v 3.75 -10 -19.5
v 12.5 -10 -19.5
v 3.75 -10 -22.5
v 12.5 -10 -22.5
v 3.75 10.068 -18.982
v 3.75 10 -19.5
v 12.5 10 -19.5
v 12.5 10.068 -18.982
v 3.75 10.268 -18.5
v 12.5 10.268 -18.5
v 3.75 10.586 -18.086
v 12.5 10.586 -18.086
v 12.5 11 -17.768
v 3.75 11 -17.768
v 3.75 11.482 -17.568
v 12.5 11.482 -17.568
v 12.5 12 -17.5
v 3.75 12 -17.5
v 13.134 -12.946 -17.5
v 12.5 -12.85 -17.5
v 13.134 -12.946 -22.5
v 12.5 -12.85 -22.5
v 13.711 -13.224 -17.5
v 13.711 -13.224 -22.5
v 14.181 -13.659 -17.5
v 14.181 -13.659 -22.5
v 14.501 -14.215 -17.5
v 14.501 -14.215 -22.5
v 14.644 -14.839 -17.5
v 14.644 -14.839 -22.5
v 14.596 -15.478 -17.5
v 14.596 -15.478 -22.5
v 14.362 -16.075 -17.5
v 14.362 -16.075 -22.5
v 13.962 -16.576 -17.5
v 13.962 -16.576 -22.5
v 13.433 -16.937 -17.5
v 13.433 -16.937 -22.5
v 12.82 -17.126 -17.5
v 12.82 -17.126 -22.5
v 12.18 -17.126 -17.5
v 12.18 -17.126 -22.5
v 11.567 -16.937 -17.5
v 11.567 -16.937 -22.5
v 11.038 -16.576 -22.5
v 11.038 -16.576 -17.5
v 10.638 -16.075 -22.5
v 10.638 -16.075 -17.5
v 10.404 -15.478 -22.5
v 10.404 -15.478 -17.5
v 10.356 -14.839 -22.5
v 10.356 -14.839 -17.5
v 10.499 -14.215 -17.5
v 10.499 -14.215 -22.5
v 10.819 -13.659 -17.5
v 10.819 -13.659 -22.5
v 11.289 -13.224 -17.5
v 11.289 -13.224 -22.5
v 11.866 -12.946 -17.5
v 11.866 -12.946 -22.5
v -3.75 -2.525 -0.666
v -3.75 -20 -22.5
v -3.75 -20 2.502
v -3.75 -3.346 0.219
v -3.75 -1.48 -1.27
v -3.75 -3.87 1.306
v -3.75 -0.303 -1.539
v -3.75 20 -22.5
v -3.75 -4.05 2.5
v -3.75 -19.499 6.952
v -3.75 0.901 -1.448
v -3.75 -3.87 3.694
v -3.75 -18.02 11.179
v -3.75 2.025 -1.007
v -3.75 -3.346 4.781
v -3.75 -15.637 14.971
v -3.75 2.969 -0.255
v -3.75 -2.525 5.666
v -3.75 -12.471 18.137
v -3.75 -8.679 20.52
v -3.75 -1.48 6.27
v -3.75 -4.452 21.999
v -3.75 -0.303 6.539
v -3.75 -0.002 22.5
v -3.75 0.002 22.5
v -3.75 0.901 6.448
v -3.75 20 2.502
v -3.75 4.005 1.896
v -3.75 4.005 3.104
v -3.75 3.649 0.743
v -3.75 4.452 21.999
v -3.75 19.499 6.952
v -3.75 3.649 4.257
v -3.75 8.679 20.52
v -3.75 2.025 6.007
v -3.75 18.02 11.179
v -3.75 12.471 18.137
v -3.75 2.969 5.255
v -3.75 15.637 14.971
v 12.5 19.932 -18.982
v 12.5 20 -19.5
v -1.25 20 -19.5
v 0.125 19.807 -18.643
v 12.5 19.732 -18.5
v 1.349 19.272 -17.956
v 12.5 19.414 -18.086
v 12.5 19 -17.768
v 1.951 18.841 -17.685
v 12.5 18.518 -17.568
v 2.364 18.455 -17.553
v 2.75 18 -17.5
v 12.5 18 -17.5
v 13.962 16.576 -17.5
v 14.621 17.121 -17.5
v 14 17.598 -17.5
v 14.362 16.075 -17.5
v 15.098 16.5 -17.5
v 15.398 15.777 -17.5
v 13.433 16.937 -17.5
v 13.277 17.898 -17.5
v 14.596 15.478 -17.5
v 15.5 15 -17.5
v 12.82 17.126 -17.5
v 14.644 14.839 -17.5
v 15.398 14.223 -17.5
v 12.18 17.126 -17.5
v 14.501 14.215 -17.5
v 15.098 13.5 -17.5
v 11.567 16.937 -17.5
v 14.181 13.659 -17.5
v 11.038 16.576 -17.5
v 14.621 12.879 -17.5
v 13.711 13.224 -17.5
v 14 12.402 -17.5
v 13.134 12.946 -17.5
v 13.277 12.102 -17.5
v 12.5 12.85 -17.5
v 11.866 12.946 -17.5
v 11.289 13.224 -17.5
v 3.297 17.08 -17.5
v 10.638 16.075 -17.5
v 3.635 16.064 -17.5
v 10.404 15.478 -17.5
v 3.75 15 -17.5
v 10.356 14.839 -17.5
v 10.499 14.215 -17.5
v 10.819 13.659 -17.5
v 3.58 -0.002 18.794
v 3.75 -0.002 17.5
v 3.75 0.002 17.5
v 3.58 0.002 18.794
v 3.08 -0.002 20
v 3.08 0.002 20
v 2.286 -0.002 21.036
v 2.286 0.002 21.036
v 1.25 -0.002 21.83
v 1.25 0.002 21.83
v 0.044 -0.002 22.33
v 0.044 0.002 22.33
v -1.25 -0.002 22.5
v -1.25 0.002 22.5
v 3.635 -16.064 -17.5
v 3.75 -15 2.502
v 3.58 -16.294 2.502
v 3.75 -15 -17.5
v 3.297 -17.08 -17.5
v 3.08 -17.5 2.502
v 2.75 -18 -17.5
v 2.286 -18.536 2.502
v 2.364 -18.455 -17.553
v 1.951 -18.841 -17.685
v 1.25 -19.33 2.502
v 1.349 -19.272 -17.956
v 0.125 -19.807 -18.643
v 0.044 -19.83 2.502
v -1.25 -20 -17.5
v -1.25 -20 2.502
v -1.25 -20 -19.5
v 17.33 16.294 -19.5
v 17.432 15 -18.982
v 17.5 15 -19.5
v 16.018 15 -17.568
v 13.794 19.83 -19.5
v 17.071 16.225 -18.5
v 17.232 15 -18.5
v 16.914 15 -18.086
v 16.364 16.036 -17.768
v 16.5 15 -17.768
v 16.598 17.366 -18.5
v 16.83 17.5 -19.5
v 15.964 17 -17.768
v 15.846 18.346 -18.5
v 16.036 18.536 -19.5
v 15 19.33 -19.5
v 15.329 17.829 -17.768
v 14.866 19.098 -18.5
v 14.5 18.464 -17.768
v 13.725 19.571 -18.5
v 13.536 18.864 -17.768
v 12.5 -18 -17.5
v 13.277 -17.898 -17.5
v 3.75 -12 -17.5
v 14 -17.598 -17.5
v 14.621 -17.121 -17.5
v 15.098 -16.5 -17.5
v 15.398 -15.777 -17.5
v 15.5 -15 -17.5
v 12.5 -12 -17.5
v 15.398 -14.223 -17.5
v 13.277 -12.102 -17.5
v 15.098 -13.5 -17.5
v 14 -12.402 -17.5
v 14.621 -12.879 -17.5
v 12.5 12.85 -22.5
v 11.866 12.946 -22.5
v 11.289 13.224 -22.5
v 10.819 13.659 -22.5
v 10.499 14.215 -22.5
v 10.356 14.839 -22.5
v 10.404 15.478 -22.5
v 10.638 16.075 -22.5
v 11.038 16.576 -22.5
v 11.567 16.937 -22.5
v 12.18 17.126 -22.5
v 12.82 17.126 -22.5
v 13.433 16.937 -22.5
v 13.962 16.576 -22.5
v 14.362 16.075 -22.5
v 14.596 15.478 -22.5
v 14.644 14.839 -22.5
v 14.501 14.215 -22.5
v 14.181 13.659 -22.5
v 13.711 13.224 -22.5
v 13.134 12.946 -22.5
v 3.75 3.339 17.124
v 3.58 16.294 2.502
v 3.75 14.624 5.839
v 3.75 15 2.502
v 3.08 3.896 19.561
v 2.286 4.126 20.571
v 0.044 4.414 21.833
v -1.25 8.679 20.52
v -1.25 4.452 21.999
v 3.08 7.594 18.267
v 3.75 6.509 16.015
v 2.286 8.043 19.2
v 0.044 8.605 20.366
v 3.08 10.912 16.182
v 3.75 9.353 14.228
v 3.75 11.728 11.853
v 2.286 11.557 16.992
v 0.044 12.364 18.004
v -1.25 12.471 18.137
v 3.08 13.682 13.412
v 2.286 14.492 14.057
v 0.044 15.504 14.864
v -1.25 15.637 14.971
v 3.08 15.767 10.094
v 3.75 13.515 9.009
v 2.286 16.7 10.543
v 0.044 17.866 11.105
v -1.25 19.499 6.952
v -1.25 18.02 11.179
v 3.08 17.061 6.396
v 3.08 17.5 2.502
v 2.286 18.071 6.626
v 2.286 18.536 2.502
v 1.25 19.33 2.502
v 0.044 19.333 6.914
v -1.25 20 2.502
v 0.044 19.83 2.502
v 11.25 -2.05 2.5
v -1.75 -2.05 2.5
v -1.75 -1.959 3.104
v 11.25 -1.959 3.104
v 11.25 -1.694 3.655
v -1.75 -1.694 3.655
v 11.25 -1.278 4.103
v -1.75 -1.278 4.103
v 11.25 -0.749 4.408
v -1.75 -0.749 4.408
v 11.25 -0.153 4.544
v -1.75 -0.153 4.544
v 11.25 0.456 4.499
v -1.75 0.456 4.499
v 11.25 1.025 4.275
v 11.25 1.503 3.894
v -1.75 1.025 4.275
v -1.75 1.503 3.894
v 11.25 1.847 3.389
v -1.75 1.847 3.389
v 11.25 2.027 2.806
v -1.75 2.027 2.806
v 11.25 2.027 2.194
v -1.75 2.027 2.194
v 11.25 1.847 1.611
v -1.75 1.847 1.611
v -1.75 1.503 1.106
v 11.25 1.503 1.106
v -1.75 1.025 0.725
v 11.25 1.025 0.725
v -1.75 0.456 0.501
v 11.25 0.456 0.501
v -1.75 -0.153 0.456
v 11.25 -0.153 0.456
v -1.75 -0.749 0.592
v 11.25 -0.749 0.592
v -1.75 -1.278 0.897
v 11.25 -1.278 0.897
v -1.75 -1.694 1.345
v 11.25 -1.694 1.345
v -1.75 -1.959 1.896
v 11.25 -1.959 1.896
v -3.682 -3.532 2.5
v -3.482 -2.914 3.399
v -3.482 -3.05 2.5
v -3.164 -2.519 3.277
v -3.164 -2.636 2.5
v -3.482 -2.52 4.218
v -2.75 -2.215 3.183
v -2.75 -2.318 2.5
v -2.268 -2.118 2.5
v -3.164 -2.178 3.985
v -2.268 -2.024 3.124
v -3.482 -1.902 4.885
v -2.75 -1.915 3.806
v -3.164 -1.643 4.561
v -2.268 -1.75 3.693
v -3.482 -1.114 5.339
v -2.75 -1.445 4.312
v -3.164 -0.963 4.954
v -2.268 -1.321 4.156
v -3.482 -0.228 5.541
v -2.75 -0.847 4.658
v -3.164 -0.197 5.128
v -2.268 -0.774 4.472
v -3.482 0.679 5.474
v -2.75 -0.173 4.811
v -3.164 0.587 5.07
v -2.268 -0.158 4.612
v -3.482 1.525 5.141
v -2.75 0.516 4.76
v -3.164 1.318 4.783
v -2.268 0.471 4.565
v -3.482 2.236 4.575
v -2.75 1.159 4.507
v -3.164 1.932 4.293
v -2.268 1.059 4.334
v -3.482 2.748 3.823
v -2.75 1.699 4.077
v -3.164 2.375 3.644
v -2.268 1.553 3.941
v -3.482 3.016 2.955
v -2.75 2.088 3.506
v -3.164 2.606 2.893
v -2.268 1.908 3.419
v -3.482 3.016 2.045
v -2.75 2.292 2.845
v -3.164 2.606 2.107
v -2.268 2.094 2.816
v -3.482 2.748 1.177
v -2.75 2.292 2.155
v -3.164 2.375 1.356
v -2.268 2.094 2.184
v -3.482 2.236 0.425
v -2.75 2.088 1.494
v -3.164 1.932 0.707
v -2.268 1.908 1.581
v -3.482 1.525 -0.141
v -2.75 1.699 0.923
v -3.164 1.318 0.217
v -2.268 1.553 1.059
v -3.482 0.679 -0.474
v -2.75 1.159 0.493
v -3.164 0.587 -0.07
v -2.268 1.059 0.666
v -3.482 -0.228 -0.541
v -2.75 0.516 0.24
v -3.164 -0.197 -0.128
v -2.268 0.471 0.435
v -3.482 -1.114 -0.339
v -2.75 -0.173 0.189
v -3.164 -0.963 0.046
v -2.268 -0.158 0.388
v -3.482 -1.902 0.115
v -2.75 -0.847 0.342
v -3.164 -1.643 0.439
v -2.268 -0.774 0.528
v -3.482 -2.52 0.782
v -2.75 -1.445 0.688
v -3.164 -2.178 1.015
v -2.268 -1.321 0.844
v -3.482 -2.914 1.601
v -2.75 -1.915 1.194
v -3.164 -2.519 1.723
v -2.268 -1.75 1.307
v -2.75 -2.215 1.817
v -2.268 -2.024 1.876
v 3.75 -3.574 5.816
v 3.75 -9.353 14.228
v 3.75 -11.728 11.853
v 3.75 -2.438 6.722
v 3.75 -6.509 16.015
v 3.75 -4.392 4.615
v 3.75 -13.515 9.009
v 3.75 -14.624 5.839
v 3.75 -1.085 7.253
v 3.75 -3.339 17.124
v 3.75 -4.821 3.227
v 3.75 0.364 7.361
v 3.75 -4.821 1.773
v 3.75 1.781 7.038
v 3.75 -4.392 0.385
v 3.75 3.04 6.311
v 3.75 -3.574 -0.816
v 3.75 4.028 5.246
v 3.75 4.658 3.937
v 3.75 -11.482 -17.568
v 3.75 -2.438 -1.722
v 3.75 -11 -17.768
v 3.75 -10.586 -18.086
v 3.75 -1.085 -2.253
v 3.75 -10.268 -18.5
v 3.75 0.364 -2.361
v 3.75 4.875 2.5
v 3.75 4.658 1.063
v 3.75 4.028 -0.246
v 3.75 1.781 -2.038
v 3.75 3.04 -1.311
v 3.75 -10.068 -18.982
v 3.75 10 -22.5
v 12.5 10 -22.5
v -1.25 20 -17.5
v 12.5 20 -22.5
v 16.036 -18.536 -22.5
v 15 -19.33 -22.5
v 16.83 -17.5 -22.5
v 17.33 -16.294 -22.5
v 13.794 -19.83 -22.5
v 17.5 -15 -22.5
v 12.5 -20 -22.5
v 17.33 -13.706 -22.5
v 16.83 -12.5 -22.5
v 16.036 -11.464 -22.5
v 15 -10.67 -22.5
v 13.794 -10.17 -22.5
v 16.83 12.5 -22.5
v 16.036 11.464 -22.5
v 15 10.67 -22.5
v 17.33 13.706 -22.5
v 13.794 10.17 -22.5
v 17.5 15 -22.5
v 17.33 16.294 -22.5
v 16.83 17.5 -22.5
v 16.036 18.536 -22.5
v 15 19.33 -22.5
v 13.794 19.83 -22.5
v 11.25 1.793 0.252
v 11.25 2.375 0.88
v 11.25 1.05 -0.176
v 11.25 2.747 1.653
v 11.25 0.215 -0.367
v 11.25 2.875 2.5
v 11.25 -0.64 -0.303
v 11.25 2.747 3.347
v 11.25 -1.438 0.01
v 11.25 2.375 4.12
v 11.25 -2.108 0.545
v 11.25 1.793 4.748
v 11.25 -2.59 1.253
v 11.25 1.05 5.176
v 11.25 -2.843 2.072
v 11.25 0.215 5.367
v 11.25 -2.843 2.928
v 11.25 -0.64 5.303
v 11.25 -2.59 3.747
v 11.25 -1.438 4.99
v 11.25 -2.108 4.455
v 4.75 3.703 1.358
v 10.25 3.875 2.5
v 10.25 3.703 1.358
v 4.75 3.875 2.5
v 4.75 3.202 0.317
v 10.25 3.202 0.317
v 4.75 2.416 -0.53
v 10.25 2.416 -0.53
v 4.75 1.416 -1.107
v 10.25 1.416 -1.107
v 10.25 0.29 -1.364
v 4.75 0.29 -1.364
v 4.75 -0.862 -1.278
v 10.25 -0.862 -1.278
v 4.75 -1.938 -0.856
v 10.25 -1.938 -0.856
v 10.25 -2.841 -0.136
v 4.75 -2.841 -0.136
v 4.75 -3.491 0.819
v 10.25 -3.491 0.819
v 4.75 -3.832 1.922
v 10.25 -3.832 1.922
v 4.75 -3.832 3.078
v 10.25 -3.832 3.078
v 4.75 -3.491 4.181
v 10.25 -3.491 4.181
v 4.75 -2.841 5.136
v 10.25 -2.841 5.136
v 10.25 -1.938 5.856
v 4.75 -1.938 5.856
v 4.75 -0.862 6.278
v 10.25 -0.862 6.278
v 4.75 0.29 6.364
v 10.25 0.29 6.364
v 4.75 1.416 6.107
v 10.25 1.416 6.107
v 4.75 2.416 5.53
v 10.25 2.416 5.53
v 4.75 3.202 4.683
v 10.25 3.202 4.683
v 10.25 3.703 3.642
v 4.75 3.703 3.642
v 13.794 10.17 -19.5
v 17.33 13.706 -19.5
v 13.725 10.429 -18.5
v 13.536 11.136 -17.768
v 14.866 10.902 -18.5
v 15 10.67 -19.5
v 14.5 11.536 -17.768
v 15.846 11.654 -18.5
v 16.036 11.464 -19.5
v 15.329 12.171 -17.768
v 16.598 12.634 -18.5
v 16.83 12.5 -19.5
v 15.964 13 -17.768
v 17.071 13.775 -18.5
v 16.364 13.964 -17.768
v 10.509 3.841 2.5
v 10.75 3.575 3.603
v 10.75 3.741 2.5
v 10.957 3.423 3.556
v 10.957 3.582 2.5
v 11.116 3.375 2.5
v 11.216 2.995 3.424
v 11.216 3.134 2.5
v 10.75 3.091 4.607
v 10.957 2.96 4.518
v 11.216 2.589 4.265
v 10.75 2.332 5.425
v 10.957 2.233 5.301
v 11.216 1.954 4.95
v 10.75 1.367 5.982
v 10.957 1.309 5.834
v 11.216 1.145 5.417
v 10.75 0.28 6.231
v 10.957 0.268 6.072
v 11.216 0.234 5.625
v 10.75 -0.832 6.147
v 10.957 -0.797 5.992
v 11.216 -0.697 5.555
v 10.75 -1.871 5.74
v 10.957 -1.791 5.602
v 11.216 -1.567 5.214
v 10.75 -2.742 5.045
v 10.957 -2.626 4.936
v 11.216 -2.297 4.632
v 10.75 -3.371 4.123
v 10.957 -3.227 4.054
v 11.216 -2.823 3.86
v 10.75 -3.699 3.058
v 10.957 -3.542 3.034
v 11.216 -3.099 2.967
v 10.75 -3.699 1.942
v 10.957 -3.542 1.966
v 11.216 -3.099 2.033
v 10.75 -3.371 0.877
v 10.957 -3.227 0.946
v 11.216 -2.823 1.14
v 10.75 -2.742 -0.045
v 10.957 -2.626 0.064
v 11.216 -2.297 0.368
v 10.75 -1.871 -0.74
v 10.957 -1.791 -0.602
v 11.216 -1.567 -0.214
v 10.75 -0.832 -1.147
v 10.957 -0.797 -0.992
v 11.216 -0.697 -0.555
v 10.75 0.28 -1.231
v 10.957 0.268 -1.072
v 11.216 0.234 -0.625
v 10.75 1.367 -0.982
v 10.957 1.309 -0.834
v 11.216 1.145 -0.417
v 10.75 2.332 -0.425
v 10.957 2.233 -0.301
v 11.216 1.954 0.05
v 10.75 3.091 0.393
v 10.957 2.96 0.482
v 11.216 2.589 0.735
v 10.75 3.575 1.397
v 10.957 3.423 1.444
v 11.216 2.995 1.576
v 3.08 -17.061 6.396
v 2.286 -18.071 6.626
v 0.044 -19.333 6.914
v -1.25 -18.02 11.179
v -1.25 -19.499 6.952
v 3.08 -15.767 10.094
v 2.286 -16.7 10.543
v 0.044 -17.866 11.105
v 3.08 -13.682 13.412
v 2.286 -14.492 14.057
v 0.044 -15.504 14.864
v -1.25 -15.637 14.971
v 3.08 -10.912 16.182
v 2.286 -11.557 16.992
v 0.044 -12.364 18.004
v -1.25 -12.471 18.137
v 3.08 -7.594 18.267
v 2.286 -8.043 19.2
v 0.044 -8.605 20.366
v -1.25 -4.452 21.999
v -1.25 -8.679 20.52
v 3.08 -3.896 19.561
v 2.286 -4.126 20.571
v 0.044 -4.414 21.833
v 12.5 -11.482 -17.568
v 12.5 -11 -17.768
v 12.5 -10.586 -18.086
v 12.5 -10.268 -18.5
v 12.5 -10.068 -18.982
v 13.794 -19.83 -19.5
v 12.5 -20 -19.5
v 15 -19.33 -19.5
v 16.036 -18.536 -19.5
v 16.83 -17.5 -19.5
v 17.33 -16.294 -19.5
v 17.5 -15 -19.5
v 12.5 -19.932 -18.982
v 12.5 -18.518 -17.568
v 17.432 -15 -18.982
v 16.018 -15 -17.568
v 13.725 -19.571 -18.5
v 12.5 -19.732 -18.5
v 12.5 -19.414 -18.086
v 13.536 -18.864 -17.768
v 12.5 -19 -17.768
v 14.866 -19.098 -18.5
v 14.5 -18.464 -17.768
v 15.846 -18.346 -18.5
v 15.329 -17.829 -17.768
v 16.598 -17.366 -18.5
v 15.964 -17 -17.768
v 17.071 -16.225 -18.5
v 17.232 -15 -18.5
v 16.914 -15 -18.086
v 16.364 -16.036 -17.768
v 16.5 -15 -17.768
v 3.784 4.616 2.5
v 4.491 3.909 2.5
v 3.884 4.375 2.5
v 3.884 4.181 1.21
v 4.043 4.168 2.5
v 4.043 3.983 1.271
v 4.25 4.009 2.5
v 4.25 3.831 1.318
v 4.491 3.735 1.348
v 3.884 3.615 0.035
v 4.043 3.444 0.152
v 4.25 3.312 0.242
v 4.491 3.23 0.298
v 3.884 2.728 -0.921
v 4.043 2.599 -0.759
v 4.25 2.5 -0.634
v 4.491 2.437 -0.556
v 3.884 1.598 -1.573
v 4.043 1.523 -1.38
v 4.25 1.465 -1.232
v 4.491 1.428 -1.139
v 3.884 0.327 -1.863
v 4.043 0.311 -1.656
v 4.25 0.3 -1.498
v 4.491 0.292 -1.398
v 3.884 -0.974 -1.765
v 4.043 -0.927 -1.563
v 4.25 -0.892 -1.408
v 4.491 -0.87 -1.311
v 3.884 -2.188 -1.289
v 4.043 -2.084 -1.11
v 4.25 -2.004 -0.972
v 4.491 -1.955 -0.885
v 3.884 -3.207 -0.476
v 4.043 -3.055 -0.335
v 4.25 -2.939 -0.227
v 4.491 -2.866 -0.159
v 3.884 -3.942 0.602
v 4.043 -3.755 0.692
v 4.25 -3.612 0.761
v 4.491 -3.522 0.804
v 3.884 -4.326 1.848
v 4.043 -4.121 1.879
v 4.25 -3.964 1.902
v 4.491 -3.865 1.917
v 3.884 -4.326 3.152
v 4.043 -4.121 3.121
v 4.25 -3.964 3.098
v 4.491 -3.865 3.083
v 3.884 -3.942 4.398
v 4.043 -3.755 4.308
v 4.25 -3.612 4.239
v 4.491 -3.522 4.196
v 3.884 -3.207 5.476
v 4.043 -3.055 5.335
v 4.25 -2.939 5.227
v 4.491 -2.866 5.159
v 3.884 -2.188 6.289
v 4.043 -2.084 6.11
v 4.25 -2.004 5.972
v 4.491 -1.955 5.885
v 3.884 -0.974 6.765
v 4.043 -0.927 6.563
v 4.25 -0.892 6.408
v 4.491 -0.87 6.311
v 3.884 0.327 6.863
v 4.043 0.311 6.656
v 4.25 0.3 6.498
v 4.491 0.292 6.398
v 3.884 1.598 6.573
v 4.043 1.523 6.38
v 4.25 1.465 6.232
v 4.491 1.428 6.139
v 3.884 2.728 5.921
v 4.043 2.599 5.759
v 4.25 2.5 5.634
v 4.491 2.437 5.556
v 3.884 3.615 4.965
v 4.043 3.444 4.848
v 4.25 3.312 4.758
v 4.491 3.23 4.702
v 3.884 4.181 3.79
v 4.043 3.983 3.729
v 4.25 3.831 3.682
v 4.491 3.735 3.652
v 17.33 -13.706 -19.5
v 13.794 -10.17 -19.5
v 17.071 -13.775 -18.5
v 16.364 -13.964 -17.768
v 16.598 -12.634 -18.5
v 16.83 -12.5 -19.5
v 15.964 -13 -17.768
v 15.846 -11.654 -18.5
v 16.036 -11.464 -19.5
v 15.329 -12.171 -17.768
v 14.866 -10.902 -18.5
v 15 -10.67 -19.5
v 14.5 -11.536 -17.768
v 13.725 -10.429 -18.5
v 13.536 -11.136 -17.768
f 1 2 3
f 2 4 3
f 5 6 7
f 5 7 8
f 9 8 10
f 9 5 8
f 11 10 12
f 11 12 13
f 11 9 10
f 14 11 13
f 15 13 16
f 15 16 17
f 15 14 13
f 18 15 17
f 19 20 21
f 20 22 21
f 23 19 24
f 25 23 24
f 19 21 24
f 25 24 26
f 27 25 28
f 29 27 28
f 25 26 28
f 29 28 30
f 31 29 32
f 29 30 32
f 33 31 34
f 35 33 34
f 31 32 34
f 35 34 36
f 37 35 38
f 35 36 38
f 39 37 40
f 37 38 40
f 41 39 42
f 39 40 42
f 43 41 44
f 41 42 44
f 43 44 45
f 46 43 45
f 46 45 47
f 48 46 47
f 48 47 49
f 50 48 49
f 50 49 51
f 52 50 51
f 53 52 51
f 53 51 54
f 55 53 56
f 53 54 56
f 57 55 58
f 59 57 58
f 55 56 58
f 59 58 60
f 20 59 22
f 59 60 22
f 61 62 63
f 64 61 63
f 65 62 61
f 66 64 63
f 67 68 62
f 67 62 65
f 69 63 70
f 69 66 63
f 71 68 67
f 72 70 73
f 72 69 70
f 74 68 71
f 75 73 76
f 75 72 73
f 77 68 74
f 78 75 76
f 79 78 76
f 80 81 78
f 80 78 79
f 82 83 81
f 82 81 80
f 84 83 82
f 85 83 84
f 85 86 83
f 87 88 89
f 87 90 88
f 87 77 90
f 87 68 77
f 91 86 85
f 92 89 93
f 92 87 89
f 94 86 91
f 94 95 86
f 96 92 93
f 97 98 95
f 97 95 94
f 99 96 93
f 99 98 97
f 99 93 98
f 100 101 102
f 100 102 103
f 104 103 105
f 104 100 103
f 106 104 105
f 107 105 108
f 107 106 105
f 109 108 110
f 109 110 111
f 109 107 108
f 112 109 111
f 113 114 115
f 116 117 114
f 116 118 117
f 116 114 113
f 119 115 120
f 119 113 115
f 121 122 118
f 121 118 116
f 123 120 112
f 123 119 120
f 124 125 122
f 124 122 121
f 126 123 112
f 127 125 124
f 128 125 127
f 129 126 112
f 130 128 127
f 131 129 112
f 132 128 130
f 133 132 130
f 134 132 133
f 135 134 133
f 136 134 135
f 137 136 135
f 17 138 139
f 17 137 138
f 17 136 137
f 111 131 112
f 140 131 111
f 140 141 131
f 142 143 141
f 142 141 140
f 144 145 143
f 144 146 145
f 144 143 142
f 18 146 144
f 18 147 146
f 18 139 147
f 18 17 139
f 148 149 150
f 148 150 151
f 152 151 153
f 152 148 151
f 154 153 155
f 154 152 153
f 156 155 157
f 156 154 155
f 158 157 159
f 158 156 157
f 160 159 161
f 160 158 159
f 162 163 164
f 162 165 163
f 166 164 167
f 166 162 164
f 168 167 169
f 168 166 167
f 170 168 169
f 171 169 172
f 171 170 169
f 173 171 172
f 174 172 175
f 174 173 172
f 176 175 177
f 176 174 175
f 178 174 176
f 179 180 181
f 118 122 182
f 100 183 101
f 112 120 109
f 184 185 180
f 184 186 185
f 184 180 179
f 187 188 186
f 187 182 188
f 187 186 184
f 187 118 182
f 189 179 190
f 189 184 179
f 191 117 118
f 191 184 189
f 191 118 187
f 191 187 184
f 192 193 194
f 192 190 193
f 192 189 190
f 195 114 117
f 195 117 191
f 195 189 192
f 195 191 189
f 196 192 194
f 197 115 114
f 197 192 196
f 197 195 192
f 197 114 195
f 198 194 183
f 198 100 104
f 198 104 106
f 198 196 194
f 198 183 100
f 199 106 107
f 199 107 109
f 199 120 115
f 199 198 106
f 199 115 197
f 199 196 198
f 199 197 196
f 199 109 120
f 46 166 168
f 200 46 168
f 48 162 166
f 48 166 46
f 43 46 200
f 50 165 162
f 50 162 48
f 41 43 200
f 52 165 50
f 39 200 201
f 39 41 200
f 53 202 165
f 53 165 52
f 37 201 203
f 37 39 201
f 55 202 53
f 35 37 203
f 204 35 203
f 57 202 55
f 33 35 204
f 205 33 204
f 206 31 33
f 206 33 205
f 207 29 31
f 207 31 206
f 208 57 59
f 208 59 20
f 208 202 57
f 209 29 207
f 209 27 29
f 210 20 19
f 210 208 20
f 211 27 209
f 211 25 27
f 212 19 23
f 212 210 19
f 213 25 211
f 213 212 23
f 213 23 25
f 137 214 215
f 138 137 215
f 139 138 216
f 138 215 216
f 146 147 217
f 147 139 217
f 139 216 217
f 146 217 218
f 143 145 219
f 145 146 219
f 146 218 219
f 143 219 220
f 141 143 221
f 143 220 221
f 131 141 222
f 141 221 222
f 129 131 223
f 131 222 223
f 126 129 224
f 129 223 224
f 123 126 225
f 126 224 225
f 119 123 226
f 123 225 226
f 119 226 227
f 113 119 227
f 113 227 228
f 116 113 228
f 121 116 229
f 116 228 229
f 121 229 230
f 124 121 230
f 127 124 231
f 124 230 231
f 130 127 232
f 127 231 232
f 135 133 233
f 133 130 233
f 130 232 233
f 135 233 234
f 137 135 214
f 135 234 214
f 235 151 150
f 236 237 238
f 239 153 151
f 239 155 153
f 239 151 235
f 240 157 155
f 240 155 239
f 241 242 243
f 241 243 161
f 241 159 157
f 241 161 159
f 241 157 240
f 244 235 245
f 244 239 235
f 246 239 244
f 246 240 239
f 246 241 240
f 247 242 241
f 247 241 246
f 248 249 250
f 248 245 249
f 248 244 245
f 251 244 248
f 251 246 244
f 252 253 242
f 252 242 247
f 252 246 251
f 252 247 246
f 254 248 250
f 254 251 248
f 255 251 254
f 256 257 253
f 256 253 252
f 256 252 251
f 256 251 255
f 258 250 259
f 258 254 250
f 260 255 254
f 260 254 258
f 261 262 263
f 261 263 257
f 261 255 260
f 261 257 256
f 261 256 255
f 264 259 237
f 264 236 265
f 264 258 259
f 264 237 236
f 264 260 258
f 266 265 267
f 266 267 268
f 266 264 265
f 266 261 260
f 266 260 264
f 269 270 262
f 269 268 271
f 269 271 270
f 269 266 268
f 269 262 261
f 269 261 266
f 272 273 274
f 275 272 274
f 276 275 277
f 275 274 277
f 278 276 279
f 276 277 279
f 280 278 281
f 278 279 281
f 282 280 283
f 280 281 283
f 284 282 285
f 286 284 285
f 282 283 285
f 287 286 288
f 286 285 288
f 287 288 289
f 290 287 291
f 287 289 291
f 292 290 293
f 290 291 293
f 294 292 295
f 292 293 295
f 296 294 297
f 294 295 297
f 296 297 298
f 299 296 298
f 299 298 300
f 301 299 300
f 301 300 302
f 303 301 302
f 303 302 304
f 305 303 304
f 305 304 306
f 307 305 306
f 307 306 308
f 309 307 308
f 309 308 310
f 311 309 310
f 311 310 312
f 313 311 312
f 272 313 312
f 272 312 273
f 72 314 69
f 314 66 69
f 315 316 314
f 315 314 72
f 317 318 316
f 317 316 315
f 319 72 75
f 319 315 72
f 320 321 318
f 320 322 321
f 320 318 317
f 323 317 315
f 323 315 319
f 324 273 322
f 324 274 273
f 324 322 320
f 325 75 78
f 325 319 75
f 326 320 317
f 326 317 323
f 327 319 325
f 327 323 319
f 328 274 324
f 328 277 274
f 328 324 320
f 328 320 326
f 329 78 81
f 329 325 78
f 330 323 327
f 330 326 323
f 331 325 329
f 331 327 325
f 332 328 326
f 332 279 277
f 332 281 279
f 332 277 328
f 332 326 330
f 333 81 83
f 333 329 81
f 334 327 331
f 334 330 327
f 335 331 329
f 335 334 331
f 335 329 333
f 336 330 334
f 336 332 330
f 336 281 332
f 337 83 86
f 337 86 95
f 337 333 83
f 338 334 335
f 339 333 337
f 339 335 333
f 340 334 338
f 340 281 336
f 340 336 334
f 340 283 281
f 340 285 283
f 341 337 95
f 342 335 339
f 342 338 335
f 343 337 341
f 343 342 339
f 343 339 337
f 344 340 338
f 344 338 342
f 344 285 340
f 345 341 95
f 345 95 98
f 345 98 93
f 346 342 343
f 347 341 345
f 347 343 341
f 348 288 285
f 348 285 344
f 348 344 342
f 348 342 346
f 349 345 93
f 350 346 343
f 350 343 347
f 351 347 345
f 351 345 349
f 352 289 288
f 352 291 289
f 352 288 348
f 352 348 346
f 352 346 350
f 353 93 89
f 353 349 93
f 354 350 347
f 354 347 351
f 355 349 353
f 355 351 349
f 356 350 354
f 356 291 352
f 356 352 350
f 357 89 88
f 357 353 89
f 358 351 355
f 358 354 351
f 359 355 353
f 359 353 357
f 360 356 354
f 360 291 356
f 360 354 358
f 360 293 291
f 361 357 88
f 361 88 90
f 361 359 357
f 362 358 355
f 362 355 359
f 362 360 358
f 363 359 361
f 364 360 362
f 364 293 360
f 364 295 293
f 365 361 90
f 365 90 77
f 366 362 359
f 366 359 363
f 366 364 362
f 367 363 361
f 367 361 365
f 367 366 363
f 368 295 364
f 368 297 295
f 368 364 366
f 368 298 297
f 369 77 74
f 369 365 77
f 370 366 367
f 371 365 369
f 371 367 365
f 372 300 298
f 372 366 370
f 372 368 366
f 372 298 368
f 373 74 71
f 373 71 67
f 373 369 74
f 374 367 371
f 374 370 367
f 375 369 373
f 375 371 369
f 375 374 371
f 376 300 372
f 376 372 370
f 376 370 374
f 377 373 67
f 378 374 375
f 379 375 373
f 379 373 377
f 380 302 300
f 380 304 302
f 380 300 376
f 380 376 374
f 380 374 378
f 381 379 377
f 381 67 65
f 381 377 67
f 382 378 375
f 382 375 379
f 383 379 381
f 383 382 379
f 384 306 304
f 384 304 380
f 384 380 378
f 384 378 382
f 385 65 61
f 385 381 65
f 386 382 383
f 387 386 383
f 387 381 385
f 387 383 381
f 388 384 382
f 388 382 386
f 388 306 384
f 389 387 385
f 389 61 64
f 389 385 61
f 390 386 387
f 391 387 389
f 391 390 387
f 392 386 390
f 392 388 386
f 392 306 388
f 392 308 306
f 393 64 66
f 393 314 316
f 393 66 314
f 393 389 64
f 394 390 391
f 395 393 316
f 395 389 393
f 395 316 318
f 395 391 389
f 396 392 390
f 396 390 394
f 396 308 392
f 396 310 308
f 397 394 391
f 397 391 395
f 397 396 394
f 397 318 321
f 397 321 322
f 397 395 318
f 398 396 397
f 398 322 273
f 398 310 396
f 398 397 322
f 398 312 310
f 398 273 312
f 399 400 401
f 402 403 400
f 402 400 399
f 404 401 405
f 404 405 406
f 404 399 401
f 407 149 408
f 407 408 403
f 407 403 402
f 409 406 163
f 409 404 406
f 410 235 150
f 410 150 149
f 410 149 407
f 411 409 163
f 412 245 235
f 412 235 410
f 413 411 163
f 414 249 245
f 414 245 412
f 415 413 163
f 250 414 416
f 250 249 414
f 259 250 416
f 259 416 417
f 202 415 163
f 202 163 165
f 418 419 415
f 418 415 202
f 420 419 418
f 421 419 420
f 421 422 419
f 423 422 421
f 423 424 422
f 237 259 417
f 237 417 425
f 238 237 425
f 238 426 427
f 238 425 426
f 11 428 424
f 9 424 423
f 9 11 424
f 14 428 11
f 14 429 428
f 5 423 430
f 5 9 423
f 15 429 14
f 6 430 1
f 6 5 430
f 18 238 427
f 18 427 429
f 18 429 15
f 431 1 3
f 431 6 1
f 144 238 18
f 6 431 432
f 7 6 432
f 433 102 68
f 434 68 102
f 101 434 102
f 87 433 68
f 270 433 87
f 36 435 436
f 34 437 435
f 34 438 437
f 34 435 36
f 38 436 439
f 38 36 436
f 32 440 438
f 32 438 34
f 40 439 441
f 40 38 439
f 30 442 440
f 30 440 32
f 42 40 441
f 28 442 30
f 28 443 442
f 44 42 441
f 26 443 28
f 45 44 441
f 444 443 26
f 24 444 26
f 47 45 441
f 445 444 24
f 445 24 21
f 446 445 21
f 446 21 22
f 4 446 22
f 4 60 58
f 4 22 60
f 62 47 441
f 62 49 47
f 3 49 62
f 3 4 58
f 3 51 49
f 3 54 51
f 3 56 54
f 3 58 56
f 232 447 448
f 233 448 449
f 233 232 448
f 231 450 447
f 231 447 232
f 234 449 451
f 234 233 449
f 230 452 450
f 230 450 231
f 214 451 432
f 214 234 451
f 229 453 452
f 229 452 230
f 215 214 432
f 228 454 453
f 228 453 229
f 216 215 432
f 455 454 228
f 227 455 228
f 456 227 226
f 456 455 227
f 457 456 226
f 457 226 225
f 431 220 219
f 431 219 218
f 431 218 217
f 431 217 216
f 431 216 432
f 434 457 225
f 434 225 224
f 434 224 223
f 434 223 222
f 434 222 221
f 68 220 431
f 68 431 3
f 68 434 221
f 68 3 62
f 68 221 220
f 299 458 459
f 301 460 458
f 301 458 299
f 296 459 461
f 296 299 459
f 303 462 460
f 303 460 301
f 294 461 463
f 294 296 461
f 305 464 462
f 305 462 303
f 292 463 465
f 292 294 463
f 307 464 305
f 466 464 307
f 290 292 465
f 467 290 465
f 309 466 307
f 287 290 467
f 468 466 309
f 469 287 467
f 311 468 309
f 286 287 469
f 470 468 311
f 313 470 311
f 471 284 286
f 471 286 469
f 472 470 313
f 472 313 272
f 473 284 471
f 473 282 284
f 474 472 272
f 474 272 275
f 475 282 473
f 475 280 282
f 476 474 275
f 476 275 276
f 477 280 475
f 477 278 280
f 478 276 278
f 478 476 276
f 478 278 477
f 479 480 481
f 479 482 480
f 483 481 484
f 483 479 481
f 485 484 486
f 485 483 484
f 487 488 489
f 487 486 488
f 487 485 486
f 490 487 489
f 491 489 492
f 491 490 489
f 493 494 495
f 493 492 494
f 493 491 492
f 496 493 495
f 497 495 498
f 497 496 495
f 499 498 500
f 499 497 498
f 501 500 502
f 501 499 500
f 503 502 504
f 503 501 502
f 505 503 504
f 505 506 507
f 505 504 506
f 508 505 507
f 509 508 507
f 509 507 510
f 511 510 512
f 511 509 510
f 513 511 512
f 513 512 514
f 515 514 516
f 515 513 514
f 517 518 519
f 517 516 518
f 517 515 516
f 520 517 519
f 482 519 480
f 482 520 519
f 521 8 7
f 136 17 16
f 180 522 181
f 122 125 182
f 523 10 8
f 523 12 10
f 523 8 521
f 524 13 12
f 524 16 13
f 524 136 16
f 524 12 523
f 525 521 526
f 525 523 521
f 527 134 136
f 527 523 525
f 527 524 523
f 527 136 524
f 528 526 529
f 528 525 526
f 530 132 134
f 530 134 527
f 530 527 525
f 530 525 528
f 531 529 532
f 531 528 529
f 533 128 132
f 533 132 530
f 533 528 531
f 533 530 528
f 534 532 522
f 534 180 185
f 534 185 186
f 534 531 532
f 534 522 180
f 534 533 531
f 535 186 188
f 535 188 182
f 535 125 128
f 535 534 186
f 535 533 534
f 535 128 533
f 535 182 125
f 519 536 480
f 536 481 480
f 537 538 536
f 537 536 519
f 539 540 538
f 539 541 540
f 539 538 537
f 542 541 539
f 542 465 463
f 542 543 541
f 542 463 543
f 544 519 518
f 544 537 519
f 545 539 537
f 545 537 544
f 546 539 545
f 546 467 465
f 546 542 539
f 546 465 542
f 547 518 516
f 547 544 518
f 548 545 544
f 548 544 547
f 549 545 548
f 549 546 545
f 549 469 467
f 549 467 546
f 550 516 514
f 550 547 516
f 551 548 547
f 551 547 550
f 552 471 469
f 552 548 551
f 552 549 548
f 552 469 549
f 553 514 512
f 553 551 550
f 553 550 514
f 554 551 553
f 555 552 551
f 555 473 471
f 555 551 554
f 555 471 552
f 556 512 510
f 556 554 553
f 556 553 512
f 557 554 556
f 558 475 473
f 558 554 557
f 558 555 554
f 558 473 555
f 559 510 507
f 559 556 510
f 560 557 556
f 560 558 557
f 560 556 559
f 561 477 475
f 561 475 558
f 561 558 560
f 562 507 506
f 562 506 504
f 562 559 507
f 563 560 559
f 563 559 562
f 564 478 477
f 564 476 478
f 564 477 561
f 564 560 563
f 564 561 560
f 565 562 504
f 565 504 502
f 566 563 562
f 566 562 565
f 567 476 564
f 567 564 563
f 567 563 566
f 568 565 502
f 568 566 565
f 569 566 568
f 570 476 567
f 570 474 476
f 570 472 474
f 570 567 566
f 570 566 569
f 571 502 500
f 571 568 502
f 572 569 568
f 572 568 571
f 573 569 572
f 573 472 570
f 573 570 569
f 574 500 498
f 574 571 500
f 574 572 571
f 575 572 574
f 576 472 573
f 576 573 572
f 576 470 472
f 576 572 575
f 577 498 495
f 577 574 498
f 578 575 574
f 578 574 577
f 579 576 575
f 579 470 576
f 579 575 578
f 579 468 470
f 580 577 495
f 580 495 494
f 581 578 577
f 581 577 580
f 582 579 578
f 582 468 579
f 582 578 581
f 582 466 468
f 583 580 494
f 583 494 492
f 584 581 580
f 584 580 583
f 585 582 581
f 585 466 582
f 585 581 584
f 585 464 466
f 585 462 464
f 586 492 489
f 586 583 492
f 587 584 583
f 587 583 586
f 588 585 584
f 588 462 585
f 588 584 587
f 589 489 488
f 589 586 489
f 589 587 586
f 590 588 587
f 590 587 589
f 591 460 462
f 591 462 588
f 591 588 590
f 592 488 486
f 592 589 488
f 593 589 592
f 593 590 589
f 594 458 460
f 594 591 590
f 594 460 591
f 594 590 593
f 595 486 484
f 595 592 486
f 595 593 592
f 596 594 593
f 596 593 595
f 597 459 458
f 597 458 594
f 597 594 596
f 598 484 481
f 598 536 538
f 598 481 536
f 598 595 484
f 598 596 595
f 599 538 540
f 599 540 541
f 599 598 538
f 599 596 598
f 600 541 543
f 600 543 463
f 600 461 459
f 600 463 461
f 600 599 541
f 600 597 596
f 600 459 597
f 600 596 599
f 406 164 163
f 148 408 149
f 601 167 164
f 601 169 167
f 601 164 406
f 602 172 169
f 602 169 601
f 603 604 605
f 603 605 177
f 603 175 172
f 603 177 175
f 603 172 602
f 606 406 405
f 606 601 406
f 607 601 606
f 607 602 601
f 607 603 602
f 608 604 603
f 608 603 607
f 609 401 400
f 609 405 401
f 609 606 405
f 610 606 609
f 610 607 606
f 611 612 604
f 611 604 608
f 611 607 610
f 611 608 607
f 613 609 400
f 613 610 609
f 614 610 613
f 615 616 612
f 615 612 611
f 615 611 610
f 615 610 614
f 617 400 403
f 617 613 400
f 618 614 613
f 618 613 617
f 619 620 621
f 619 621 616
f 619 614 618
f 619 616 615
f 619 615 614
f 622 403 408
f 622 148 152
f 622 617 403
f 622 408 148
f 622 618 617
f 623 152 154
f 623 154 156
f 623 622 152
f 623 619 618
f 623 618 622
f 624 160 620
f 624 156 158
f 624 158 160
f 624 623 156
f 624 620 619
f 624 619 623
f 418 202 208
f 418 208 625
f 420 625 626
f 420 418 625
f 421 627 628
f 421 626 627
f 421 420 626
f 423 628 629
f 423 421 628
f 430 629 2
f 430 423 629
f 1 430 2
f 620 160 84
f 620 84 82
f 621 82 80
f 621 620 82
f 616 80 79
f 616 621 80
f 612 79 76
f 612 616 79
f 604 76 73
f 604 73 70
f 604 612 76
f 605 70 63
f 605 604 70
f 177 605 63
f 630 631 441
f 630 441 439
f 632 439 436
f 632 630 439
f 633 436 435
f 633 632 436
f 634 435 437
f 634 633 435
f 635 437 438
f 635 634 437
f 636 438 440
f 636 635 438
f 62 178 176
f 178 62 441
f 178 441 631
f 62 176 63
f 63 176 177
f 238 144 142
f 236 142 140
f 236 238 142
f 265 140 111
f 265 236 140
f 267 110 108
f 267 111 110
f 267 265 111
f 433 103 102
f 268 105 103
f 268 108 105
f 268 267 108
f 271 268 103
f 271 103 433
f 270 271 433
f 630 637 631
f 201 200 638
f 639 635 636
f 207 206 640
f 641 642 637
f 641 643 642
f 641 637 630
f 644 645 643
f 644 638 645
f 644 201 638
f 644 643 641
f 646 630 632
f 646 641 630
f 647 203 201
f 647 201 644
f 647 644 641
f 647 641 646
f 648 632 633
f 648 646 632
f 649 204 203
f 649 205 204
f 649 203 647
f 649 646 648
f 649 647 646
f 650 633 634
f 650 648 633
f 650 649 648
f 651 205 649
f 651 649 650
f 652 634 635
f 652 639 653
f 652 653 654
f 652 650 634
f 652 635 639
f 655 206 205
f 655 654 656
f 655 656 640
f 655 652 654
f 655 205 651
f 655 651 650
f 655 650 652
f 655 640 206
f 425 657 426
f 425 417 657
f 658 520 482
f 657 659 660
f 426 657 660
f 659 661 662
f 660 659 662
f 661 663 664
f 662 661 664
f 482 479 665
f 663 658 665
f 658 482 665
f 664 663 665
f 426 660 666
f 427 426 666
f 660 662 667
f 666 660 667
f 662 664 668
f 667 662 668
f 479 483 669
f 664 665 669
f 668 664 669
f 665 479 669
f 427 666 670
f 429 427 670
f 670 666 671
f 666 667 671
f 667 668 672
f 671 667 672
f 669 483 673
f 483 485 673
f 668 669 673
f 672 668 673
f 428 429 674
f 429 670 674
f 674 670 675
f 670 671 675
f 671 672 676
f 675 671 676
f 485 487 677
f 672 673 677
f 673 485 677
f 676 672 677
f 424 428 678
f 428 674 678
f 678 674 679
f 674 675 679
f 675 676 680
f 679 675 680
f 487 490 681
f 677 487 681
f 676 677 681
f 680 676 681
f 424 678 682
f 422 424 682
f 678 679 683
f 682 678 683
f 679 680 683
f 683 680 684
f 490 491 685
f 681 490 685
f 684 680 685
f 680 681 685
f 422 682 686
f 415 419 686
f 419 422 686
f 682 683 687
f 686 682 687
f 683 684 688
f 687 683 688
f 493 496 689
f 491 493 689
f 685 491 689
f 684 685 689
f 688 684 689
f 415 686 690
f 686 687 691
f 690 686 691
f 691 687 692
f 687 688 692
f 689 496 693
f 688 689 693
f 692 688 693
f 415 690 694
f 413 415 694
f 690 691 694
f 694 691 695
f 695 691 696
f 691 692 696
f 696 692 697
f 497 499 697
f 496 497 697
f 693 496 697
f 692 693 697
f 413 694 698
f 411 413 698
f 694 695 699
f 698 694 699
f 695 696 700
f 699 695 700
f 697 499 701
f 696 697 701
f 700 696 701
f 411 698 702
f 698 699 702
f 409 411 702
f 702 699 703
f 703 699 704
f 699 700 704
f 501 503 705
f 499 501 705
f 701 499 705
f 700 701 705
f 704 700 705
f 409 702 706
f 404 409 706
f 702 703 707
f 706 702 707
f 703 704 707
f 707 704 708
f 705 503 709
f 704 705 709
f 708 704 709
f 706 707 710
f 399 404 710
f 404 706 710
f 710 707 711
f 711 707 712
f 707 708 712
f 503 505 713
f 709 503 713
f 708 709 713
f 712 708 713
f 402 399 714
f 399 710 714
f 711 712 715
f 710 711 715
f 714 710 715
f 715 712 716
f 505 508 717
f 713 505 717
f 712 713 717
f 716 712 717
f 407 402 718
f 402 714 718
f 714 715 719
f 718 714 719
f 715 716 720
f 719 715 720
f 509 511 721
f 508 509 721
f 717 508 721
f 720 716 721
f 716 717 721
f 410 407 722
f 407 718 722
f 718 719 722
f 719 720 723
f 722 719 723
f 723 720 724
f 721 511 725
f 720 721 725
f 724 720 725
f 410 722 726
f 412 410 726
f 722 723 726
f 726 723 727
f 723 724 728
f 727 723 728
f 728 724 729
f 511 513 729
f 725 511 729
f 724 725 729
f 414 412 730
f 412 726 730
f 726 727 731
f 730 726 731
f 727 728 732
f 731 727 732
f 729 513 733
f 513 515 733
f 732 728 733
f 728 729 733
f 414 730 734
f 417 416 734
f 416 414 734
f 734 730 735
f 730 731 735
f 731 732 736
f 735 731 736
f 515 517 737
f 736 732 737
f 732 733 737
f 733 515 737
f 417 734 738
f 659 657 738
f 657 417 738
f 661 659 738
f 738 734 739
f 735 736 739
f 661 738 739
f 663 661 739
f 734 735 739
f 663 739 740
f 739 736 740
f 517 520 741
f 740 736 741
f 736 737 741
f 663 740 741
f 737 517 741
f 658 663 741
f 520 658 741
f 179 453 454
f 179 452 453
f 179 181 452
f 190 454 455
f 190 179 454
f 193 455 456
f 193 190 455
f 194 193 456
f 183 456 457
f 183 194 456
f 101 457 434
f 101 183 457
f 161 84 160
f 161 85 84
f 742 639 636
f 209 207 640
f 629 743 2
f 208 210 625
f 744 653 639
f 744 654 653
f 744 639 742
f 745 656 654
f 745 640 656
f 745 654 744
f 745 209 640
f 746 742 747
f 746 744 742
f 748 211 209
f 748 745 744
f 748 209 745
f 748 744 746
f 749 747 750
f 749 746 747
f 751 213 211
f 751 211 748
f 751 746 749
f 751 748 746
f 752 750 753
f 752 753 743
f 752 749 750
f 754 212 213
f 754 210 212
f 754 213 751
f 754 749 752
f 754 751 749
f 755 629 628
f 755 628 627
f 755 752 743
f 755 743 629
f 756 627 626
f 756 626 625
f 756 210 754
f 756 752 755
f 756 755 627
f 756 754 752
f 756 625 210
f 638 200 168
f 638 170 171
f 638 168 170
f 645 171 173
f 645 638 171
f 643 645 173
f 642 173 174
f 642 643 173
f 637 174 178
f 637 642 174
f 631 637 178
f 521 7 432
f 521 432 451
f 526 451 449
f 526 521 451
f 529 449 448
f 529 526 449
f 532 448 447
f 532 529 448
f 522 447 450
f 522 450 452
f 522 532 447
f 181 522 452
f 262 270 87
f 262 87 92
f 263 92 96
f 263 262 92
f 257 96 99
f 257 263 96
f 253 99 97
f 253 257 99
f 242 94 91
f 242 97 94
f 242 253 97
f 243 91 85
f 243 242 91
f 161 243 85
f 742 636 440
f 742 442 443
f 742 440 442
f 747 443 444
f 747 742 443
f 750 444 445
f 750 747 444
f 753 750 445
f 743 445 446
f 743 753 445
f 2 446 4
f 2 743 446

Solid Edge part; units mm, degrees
sketch "Sketch1" plane through (0, 0, 0) normal (0, -1, 0) x (1, 0, 0)
  line L0 (3.75, 22.5) -> (3.75, -22.5)
  line L1 (3.75, -22.5) -> (-3.75, -22.5)
  line L2 (-3.75, -22.5) -> (-3.75, 22.5)
  line L3 (-3.75, 22.5) -> (3.75, 22.5)
extrude "Protrusion1" add sketch "Sketch1" along normal mid plane 40
fillet "Round_1" radius 20 2 edges at (0, -20, 22.5) (0, 20, 22.5)
sketch "Sketch2" plane through (3.75, 0, 0) normal (1, 0, 0) x (0, 1, 0)
  circle A0 centre (0, 2.5) radius 3.875
extrude "ExtrudedProtrusion_2" add sketch "Sketch2" along normal mid plane 15
fillet "Round_2" radius 5 3 edges at (3.75, 0, 22.5) (3.75, -20, -10) (3.75, 20, -10)
fillet "Round_3" radius 1 2 edges at (3.75, 0, 6.375) (11.25, -3.875, 2.5)
sketch "Sketch3" plane through (0, 0, -22.5) normal (0, 0, -1) x (0, 1, 0)
  circle A0 centre (-15, 12.5) radius 2.15
  line L0 (-20, 17.5) -> (-10, 17.5)
  line L1 (-10, 17.5) -> (-10, -3.75)
  line L2 (-10, -3.75) -> (-20, -3.75)
  line L3 (-20, -3.75) -> (-20, 17.5)
  dimension "D1" = 4.3
  dimension "D2" = 10
  dimension "D3" = 21.25
  dimension "D4" = 5
extrude "ExtrudedProtrusion_3" add sketch "Sketch3" against normal blind 5
fillet "Round_4" radius 5 2 edges at (17.5, -20, -20) (17.5, -10, -20)
mirror "Mirror1" about plane through (0, 0, 0) normal (0, -1, 0) of "ExtrudedProtrusion_3"
fillet "Round1" radius 5 2 edges at (17.5, 20, -20) (17.5, 10, -20)
sketch "Sketch4" plane through (-3.75, 0, 0) normal (-1, 0, 0) x (0, -1, 0)
  circle A0 centre (0, 2.5) radius 2.05
extrude "Cutout1" cut sketch "Sketch4" against normal through all
fillet "Round_6" radius 2 1 edges at (-3.75, 2.05, 2.5)
fillet "Round_7" radius 2 4 edges at (8.125, -10, -17.5) (5.625, -20, -17.5) (8.125, 10, -17.5) (5.625, 20, -17.5)
